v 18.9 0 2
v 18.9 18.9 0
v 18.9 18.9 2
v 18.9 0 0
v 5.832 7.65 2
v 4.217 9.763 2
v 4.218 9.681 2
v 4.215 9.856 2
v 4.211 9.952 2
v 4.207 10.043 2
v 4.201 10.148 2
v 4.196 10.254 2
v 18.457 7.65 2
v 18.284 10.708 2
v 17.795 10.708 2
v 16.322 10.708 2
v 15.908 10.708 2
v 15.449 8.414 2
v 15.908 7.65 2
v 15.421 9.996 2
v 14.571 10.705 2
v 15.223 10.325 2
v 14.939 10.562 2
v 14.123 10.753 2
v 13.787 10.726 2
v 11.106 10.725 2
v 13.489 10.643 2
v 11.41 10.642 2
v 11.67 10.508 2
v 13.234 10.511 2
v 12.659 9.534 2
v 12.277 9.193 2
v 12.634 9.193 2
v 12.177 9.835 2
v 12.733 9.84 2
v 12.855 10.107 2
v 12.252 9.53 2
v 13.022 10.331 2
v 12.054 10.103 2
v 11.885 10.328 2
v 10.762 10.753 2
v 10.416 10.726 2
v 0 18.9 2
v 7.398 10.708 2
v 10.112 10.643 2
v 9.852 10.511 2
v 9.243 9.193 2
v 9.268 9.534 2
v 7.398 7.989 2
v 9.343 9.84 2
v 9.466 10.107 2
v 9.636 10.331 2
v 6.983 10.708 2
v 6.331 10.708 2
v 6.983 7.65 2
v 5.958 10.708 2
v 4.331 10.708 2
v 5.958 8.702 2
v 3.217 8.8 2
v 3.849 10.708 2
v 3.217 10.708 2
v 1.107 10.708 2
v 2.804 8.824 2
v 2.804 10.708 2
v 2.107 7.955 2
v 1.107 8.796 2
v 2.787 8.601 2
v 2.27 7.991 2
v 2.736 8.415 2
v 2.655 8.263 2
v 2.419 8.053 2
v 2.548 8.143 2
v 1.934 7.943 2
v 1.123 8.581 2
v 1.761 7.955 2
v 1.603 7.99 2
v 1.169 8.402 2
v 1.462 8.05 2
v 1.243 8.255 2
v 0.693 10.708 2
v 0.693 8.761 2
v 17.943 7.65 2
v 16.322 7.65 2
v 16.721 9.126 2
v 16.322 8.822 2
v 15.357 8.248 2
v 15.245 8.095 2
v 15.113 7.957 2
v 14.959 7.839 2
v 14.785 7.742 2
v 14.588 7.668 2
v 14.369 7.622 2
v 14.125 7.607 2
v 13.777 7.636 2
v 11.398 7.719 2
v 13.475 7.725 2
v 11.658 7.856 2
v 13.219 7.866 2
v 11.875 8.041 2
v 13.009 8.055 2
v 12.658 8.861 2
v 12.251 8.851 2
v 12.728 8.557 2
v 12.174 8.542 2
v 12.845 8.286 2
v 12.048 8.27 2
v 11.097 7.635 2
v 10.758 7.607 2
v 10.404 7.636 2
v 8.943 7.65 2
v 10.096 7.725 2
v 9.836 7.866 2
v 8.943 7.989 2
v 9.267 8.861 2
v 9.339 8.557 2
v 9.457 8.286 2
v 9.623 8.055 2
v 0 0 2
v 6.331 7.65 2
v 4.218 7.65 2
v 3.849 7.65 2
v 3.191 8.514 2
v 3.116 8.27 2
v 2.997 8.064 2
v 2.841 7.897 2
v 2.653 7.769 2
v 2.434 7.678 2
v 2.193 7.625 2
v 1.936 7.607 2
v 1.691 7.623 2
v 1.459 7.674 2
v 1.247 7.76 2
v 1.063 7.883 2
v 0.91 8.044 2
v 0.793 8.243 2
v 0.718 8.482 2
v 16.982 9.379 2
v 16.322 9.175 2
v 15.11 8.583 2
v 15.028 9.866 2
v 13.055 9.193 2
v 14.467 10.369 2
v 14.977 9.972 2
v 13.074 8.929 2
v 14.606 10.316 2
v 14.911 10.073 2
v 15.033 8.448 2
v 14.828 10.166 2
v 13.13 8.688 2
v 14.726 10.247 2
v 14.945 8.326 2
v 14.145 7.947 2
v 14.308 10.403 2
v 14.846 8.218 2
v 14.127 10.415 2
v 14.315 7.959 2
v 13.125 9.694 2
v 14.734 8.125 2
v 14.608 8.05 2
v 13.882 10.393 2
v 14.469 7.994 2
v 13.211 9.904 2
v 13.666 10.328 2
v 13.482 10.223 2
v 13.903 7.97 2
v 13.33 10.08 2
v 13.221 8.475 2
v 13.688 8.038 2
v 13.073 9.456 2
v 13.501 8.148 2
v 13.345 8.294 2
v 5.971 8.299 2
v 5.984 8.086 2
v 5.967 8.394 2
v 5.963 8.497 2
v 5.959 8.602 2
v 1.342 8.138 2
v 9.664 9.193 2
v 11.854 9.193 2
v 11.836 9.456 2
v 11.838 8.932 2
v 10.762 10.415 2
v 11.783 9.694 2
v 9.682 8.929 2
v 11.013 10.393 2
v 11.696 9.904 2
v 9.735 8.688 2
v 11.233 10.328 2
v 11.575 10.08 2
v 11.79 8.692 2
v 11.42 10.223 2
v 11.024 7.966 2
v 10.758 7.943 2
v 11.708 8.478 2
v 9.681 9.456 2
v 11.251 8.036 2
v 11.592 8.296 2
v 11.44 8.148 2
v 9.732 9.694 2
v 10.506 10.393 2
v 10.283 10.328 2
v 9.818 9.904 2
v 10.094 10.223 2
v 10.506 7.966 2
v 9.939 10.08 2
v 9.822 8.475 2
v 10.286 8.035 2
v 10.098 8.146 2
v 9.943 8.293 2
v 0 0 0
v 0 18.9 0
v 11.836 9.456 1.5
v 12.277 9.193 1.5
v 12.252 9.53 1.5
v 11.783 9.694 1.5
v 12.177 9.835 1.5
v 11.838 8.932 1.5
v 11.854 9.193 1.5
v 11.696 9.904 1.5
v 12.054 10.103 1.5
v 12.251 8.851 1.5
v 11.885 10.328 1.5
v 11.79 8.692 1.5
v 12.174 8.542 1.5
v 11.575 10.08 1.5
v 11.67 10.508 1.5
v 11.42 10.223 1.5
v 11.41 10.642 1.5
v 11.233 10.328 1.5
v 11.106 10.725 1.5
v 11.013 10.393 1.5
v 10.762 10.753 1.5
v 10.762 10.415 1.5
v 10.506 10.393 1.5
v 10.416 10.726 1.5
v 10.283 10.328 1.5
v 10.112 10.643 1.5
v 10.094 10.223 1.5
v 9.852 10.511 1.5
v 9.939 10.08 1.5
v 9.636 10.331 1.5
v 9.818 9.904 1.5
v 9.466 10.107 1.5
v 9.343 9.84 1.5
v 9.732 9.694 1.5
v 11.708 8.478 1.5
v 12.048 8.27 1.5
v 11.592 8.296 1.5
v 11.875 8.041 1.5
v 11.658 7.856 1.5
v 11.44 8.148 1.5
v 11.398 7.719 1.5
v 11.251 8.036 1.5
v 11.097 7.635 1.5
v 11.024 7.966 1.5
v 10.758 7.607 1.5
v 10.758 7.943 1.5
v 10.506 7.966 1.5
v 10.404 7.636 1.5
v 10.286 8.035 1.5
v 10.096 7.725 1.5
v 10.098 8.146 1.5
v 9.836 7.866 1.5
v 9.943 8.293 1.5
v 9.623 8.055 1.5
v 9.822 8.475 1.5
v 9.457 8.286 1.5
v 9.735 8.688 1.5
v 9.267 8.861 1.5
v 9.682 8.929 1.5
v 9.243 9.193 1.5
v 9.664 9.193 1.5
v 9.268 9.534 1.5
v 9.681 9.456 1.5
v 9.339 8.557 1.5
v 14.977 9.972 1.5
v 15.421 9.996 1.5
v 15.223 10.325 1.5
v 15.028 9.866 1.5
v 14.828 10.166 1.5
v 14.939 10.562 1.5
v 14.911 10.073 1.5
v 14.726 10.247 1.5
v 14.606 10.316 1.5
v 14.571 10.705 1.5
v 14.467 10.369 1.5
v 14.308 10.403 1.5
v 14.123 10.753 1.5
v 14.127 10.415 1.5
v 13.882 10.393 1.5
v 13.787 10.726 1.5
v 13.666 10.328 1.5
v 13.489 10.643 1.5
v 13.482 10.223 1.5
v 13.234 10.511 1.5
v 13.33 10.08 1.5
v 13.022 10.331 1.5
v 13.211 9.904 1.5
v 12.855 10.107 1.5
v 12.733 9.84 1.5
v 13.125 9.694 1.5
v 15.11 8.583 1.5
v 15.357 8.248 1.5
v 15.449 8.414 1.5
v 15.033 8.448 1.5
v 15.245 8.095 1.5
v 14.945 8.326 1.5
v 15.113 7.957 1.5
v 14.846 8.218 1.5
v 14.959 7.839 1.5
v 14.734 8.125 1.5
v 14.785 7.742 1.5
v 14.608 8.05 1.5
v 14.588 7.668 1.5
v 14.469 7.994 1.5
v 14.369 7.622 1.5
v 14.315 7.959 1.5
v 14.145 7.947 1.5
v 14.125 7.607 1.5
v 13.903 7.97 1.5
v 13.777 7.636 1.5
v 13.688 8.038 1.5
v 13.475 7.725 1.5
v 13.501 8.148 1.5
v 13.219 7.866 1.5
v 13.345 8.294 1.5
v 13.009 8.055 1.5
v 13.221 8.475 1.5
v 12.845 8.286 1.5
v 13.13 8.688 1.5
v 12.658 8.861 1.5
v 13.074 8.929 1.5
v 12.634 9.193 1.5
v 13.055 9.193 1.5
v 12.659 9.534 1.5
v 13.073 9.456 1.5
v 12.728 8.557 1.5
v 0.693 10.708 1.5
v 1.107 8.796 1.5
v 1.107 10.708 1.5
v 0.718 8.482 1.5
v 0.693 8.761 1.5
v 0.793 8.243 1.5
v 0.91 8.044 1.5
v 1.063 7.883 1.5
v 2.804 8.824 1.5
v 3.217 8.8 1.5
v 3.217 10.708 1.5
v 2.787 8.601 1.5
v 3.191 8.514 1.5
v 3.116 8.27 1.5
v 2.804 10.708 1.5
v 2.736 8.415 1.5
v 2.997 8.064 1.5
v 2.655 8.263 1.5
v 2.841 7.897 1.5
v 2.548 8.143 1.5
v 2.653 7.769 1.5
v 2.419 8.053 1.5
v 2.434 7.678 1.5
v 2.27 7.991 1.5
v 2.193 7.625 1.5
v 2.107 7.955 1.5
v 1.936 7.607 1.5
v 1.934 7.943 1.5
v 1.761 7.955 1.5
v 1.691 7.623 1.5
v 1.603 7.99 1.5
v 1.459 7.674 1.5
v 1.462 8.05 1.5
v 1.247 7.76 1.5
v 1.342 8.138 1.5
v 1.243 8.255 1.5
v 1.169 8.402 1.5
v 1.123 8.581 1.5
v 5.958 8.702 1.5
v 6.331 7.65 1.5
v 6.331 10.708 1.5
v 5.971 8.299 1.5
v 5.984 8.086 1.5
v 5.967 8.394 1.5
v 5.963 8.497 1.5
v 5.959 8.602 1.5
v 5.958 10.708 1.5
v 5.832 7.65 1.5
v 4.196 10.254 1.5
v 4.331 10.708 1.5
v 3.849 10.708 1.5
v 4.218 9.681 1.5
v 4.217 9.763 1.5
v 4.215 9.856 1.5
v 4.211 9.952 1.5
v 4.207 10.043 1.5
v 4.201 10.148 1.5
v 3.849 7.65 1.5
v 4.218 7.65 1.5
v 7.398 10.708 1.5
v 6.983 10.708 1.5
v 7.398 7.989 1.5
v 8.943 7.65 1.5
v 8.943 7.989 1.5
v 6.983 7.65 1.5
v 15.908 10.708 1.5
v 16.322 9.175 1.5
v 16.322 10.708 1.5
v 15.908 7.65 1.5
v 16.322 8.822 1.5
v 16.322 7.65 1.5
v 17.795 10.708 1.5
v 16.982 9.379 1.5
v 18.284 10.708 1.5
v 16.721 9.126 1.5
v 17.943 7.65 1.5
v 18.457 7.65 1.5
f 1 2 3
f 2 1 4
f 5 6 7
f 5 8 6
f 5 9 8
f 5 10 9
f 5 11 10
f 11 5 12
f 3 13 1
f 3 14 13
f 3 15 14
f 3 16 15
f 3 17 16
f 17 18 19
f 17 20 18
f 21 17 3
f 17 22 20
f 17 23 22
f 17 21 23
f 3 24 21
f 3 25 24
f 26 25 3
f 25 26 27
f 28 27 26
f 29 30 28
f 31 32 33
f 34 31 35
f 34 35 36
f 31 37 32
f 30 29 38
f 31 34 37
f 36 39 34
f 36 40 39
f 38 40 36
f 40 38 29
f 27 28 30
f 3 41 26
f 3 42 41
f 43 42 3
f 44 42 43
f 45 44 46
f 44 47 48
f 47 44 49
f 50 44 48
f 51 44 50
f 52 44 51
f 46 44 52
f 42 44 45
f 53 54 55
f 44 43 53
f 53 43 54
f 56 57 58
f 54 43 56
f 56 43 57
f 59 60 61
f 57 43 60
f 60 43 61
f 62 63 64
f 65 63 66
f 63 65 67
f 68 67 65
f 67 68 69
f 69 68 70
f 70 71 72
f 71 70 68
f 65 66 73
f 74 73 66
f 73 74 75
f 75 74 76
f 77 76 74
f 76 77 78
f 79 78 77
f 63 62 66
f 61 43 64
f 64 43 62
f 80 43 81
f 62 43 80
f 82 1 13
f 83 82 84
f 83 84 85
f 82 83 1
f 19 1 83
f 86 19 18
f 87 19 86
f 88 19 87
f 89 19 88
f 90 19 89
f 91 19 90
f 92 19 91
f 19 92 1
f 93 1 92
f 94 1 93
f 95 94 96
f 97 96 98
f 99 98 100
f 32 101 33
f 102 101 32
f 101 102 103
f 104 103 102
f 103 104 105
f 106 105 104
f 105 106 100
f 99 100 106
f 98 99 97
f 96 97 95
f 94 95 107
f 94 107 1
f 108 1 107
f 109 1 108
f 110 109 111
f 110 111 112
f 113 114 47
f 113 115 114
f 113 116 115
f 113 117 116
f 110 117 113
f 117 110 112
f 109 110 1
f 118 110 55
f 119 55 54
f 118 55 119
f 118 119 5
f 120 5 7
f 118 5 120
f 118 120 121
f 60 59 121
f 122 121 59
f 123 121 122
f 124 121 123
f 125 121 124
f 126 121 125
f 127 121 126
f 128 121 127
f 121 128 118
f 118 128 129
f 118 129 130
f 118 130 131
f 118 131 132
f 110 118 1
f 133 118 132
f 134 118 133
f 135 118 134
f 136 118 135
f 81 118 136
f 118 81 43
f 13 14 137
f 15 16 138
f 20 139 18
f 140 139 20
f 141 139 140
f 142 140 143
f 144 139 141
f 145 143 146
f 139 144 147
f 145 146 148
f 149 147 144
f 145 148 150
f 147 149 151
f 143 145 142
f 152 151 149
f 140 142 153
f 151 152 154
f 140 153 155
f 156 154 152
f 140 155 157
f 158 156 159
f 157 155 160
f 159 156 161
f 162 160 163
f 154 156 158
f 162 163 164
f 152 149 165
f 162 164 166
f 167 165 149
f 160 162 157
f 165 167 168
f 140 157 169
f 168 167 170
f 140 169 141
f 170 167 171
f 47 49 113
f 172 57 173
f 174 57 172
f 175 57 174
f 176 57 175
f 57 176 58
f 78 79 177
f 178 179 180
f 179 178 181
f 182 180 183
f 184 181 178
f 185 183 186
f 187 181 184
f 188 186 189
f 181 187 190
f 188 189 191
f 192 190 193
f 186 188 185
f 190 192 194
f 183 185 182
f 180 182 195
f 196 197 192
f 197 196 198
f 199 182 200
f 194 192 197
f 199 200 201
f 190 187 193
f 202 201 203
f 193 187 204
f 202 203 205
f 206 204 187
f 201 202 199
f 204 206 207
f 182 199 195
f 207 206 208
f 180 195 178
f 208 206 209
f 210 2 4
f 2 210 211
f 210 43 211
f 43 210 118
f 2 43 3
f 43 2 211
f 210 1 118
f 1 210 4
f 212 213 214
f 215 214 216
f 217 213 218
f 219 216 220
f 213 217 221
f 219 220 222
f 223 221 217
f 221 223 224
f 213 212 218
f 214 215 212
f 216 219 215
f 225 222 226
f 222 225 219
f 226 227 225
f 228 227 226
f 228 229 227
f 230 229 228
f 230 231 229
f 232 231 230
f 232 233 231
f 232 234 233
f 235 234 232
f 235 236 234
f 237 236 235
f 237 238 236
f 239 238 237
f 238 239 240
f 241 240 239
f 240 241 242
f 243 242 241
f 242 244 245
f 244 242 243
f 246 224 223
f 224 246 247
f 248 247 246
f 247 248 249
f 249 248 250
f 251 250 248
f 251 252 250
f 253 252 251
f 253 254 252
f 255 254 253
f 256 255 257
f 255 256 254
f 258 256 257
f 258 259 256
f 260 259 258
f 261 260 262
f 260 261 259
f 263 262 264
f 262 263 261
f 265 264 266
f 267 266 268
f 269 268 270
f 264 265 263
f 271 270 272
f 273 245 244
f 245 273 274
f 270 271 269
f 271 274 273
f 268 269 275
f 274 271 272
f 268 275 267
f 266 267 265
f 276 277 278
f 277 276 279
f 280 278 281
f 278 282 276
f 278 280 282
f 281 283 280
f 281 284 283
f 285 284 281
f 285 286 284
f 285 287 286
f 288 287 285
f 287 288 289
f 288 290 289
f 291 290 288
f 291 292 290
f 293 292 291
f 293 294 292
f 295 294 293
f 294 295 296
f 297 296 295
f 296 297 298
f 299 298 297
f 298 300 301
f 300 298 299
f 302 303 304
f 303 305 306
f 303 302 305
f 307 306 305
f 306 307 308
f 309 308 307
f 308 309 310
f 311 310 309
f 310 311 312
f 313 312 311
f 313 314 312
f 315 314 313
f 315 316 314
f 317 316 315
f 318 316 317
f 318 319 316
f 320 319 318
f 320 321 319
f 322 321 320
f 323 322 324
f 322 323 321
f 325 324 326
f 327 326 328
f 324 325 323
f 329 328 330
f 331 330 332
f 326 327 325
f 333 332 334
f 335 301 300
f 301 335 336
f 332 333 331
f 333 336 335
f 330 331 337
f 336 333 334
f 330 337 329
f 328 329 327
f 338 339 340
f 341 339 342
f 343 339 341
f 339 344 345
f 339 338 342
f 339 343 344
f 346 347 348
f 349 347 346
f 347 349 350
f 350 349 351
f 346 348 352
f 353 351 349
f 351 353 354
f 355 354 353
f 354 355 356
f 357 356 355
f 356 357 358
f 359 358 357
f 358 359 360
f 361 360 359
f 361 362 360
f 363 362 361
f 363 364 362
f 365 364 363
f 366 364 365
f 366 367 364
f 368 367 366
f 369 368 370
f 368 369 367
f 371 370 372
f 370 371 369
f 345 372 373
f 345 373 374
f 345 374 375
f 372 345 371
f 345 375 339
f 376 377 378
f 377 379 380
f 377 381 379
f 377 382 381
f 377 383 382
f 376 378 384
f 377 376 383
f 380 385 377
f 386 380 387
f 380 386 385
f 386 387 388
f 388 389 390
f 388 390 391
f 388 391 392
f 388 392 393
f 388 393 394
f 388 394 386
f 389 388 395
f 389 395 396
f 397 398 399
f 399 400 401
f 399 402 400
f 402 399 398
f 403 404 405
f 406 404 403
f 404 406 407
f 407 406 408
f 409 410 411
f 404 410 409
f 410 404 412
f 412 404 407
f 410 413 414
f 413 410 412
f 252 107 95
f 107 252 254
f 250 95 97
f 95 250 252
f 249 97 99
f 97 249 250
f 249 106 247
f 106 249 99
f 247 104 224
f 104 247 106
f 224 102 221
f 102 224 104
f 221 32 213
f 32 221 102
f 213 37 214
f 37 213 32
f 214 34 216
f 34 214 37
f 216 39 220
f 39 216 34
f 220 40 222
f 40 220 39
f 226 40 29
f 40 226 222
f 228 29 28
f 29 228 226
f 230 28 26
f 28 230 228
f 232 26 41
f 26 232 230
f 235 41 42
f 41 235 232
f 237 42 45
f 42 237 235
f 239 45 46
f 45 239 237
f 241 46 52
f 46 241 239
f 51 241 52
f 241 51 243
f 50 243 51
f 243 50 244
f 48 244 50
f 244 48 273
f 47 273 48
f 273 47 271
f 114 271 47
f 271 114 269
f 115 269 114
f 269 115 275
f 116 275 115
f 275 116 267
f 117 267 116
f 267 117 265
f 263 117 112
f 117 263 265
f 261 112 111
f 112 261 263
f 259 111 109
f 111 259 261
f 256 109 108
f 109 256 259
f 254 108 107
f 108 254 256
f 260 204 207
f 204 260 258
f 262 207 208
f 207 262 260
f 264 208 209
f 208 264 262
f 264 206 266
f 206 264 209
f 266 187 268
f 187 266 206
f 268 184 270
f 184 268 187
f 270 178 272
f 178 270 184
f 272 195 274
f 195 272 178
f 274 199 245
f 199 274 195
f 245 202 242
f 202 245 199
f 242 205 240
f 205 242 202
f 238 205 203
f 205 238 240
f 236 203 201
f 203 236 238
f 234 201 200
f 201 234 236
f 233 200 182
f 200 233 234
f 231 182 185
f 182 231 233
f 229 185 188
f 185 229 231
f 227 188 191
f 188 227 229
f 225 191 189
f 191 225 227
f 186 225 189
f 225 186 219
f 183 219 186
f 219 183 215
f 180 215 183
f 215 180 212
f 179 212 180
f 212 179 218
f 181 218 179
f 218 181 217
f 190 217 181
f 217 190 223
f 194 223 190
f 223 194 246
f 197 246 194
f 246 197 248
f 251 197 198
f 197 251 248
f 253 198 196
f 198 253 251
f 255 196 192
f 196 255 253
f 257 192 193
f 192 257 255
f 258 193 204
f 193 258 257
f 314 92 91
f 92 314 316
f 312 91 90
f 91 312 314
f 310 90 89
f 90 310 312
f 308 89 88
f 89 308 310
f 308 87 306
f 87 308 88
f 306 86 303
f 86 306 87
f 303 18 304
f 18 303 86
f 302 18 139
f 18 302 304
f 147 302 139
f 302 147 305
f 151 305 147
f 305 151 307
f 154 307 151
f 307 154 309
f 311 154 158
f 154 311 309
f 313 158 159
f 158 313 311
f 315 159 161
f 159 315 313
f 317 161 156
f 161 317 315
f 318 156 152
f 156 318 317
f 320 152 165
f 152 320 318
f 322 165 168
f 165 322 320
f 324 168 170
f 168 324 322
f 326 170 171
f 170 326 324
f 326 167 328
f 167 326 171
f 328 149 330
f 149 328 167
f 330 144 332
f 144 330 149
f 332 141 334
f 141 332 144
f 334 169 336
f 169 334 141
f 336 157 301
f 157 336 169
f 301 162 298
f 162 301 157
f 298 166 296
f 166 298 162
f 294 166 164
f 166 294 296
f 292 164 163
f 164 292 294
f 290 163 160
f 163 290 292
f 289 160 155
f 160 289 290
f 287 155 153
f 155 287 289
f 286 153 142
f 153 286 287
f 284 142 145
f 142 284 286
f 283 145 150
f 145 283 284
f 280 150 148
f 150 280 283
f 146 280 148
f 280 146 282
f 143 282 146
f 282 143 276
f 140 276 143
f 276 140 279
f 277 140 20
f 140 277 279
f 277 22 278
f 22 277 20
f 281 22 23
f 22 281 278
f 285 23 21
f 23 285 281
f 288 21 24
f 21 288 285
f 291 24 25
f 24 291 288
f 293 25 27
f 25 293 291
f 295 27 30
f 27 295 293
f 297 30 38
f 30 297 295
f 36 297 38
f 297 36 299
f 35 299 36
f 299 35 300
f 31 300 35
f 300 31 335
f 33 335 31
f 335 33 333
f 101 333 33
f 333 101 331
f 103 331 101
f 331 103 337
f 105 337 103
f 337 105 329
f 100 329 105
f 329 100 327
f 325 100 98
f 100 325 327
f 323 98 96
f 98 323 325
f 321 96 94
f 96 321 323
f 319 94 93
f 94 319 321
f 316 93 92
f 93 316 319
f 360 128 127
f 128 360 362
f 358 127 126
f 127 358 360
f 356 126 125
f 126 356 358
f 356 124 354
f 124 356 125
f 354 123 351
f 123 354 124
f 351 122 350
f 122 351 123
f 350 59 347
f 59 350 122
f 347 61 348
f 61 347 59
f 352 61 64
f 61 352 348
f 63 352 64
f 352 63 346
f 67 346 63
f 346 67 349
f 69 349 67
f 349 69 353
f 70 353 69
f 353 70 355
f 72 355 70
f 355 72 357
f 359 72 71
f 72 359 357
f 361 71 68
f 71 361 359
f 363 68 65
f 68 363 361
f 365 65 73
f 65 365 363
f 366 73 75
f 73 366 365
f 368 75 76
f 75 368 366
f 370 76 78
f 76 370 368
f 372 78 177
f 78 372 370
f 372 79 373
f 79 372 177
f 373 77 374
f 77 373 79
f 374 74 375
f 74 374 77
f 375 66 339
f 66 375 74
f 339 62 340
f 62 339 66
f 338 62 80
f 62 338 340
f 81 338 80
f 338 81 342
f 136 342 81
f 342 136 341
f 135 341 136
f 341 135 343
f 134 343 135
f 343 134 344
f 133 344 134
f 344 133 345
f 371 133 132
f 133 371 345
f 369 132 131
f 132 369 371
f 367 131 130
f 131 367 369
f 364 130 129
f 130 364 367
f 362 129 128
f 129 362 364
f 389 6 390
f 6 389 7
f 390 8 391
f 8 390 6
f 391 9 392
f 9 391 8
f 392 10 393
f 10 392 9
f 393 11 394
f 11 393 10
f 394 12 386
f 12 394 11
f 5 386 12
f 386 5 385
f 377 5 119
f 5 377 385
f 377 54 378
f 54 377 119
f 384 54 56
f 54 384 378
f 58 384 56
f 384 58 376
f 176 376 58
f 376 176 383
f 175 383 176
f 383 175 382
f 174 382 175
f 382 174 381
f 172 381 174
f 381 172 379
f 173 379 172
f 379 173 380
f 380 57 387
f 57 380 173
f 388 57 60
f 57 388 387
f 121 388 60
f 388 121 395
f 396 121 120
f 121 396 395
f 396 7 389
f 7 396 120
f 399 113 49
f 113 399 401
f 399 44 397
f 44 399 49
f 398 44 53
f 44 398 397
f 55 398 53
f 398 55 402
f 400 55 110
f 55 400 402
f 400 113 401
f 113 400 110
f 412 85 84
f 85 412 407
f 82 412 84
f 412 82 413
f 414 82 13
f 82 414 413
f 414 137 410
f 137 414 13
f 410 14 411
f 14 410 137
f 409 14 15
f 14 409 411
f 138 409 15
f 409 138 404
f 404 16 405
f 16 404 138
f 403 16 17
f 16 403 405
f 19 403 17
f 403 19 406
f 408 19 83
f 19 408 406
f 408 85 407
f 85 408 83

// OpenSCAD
// file: ../../../3Dlibrary/buttons.scad
// types = {
//    default
//    button-adafruit-1119
//    button-adafruit-1009
//    switch-submini
// }

module boxScrewHoles(width = 50, length = 200, overlap = 6) {
    diameter = 3.2;
    overlapTranslation = (overlap - diameter) / 2 + diameter / 2;
    borderDistance = 10;

    translate([borderDistance, overlapTranslation, -10]) cylinder(d=diameter, h=20, $fn=100);
    translate([width - borderDistance, overlapTranslation, -10]) cylinder(d=diameter, h=20, $fn=100);

    translate([borderDistance, length - overlapTranslation, -10]) cylinder(d=diameter, h=20, $fn=100);
    translate([width - borderDistance, length - overlapTranslation, -10]) cylinder(d=diameter, h=20, $fn=100);
}

module boxFaceplate(width = 50, length = 200) {
    thickness = 1;
    overlap = 8;

    difference() {
        cube(size = [width, length, thickness], center = false);
        boxScrewHoles(width, length, overlap);
    }
}

module boxInsert(width = 50, length = 200) {
    thickness = 2;
    overlap = 8;
    lengthOverlap = 4;
    riftThickness = 3;
    riftHeight = 6;

    difference() {
        union() {
            cube(size = [width, length, thickness], center = false);

            // rifts
            translate([lengthOverlap, overlap, thickness]) cube(size = [width - (lengthOverlap * 2), riftThickness, riftHeight], center = false);
            translate([lengthOverlap, length - riftThickness - overlap, thickness]) cube(size = [width - (lengthOverlap * 2), riftThickness, riftHeight], center = false);

            translate([lengthOverlap, overlap, thickness]) cube(size = [riftThickness, length - (overlap * 2), riftHeight], center = false);
            translate([width - lengthOverlap - riftThickness, overlap, thickness]) cube(size = [riftThickness, length - (overlap * 2), riftHeight], center = false);
        }

        boxScrewHoles(width, length, overlap);
    }
}

module ledHole(type="small") {
    if (type == "small") {
        translate([0, 0, -1]) cylinder(d = 3.3, h = 20, $fn = 100);
    } else {
        cylinder(d = 5.1, h = 10, $fn = 100);
    }
}

module buttonCoverHole(type = "default") {
    translate([0, 0, -1])
    if (type == "button-adafruit-1009") {
        cylinder(d = 11.6, h = 10, $fn = 100);
    } else if (type == "button-adafruit-1119") {
        cylinder(d = 6.8, h = 10, $fn = 100);
    } else if (type == "switch-submini") {
        cylinder(d = 4.9, h = 10, $fn = 100);
    } else if (type == "switch-mini") {
        translate([0, 0, -7]) cylinder(d = 5.9, h = 10, $fn = 100);
    } else if (type == "korry") {
        translate([0, 0, -7]) cube([25.5, 25.5, 10]);
    } else {
        cylinder(d = 6.8, h = 10, $fn = 100);
    }
}

module buttonBaseHole(type = "default", socketHoles = false) {
    if (type == "button-adafruit-1009") {
       translate([0, 0, -5]) cylinder(d = 13.1, h = 10, $fn = 100);
       cube(size = [14, 11.9, 16], center = true);
    } else if (type == "button-adafruit-1119") {
       cube(size = [14, 11.9, 7], center = true);
    } else if (type == "switch-submini") {
        translate([0, 0, -7]) cylinder(d = 4.9, h = 10, $fn = 100);
    } else if (type == "switch-mini") {
        translate([0, 0, -7]) cylinder(d = 5.9, h = 10, $fn = 100);
    } else if (type == "korry") {
        translate([0, 0, -7]) cube([25.5, 25.5, 10]);
    } else {
        translate([0, 0, -7]) cylinder(d = 6.8, h = 10, $fn = 100);
    }

    if (socketHoles == true) {
       translate([0, 4.5, -5]) cylinder(d = 1.5, h = 30, $fn = 100);
       translate([0, -4.5, -5]) cylinder(d = 1.5, h = 30, $fn = 100);
    }
}

module buttonBasePocket(type = "default") {
    if (type == "button-adafruit-1009") {
        translate([0, 0, 6.5]) cube(size = [12, 16, 9], center = true);
    } else if (type == "button-adafruit-1119") {
        translate([0, 0, 4]) cube(size = [12, 16, 4], center = true);
    } else {
        // no pocket at all
    }

}
// file: ../../KorrySwitch/3D/korry.scad
include <../../../3Dlibrary/buttons.scad>


module korryBase(width = 25, height = 20, thickness = 1.5, chamfer = 0.1) {

	baseWidth = width + (thickness * 2);
	// Button base
	difference() {
		union() {
			cube([baseWidth, baseWidth, 2]);
			translate([baseWidth / 2, baseWidth / 2, 0]) buttonBasePocket(type = "button-adafruit-1009");

			// screw holes amplification for base fixation
			cube([4, 4, 4]);
			translate([baseWidth - 4, baseWidth - 4, 0])
			cube([4, 4, 4]);

		}

		translate([baseWidth / 2, baseWidth / 2]) buttonBaseHole(type = "button-adafruit-1009", socketHoles = true);

		translate([3.5, baseWidth / 2, 0]) ledHole(type = "small");
		translate([baseWidth - 3.5, baseWidth / 2, 0]) ledHole(type = "small");

		// screw holes for base fixation
		translate([2, 2, -4])
		cylinder(d = 1.8, h = 10, $fn = 144);

		translate([baseWidth - 2, baseWidth - 2, -4])
		cylinder(d = 1.8, h = 10, $fn = 144);
	}




	// button base walls
	translate([0, 0, -height]) {
		cube([baseWidth, thickness, height]);
		cube([thickness, baseWidth, height]);
		translate([0, baseWidth - thickness, 0]) cube([baseWidth, thickness, height]);
		translate([baseWidth - thickness, 0, 0])cube([thickness, baseWidth, height]);
	}

	// button base wall lips

	difference() {
		union() {
			translate([0, 0, -height]) {

				translate([-thickness + chamfer / 2, -thickness, chamfer / 2])
				//minkowski() {
					cube([baseWidth - chamfer + 2 * thickness, thickness * 2 - chamfer, thickness - chamfer]);
					//sphere(d=chamfer, $fn=144);
				//}

				translate([-thickness, -thickness + chamfer / 2, chamfer / 2])
				//minkowski() {
					cube([thickness * 2 - chamfer, baseWidth - chamfer + 2 * thickness, thickness - chamfer]);
					//sphere(d=chamfer, $fn=144);
				//}


				translate([-thickness + chamfer / 2, baseWidth - thickness + chamfer / 2, chamfer / 2])
				//minkowski() {
					cube([baseWidth - chamfer + 2 * thickness, thickness * 2 - chamfer, thickness - chamfer]);
					//sphere(d=chamfer, $fn=144);
				//}

				translate([baseWidth - thickness + chamfer / 2, -thickness + chamfer / 2,  chamfer / 2])
				//minkowski() {
					cube([thickness * 2 - chamfer, baseWidth - chamfer + 2 * thickness, thickness - chamfer]);
					// cube([baseWidth - chamfer + 2 * thickness, thickness * 2 - chamfer, thickness - chamfer]);
					//sphere(d=chamfer, $fn=144);
				//}
			}
		}

		// chamfer
		translate([-10, -3, -height - 4]) {
			rotate([45, 0, 0]) cube([50, 4, 4]);
		}
		translate([-10, baseWidth - 0.2, -height - 1.5]) {
			rotate([-45, 0, 0]) cube([50, 4, 4]);
		}
		translate([baseWidth, 0, 0]) rotate([0, 0, 90]) {
			translate([-10, -3, -height - 4]) {
				rotate([45, 0, 0]) cube([50, 4, 4]);
			}
			translate([-10, baseWidth - 0.2, -height - 1.5]) {
				rotate([-45, 0, 0]) cube([50, 4, 4]);
			}
		}
	}
}

module korryButton(width = 25, height = 20, thickness = 1.5, middle = false) {

	buttonWidth = width - buttonSpace;
	buttonHeight = height - thickness - 4;
	baseWidth = width + (thickness * 2);

	// Button base
	difference() {
		cube([buttonWidth, buttonWidth, 2]);

		// bigger led holes 
		translate([2, buttonWidth / 2, -5]) cylinder(d = 10, h = 10, $fn = 144);
		translate([buttonWidth - 2, buttonWidth / 2, -5]) cylinder(d = 10, h = 10, $fn = 144);
	}

	// button walls
	translate([0, 0, -buttonHeight]) {
		cube([buttonWidth, thickness, buttonHeight]);
		cube([thickness, buttonWidth, buttonHeight + 2]);
		translate([0, buttonWidth - thickness, 0]) cube([buttonWidth, thickness, buttonHeight]);
		translate([buttonWidth - thickness, 0, 0])cube([thickness, buttonWidth, buttonHeight + 2]);
	}

	// lid supports
	supportWidth = buttonWidth-2;
	translate([1, 1, -buttonHeight + lidThickness]) {
		cube([supportWidth, thickness, 2]);
		cube([thickness, supportWidth, 2]);
		translate([0, supportWidth - thickness, 0]) cube([supportWidth, thickness, 2]);
		translate([supportWidth - thickness, 0, 0])cube([thickness, supportWidth, 2]);
	}
}

module buttonLid(width, thickness) {
	// lid supports
	lidWidth = width - thickness * 2 - buttonSpace / 2;
	cube([lidWidth, lidWidth, lidThickness]);
}
// main file
include <../../KorrySwitch/3D/korry.scad>

width = 22;
height = 12;
thickness = 1.5;
chamfer = 0.1;
buttonSpace = .2;
lidThickness = 2;

lidWidth = width - thickness * 2 - buttonSpace / 2;

font = "Liberation Sans";

korryBase(width, height, thickness, chamfer);

translate([thickness + buttonSpace / 2, thickness + buttonSpace / 2, -lidThickness -buttonSpace-4])
color("blue") korryButton(width, height, thickness);


rotate([180,0,0])
translate([thickness * 2, -lidWidth - thickness * 2, height-thickness])
!difference() {
	color("green")buttonLid(width, thickness);

	translate([0.35, lidWidth/2 - 3.6/2, thickness]) linear_extrude(height = 0.6) {
		text(text = "UNLOCK", font = font, size = 3.2);
	}
}
